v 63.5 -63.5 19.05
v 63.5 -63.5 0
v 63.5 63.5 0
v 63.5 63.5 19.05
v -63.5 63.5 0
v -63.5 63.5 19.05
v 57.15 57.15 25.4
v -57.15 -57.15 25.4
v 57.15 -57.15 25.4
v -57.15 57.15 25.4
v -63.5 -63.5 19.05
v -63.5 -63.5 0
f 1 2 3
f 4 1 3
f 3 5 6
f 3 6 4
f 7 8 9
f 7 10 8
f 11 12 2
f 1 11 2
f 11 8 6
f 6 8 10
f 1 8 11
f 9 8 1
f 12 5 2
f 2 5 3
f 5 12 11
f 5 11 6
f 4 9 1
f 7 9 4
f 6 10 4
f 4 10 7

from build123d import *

# Parameters (mm, degrees)
F0_W     = 127
F0_H     = 127
F1_DEPTH = 25.4
F2_SIZE  = 6.35


with BuildPart() as f1:
    # F0 (on Top) → F1 (new body)
    with BuildSketch(Plane.XY):
        Rectangle(F0_W, F0_H)
    extrude(amount=F1_DEPTH)

    # F2
    f2_edges = [f1.edges().sort_by_distance(p)[0] for p in [
        (0, -63.5, 25.4),
        (63.5, 0, 25.4),
        (0, 63.5, 25.4),
        (-63.5, 0, 25.4),
    ]]
    chamfer(f2_edges, length=F2_SIZE)


solid = f1.part
